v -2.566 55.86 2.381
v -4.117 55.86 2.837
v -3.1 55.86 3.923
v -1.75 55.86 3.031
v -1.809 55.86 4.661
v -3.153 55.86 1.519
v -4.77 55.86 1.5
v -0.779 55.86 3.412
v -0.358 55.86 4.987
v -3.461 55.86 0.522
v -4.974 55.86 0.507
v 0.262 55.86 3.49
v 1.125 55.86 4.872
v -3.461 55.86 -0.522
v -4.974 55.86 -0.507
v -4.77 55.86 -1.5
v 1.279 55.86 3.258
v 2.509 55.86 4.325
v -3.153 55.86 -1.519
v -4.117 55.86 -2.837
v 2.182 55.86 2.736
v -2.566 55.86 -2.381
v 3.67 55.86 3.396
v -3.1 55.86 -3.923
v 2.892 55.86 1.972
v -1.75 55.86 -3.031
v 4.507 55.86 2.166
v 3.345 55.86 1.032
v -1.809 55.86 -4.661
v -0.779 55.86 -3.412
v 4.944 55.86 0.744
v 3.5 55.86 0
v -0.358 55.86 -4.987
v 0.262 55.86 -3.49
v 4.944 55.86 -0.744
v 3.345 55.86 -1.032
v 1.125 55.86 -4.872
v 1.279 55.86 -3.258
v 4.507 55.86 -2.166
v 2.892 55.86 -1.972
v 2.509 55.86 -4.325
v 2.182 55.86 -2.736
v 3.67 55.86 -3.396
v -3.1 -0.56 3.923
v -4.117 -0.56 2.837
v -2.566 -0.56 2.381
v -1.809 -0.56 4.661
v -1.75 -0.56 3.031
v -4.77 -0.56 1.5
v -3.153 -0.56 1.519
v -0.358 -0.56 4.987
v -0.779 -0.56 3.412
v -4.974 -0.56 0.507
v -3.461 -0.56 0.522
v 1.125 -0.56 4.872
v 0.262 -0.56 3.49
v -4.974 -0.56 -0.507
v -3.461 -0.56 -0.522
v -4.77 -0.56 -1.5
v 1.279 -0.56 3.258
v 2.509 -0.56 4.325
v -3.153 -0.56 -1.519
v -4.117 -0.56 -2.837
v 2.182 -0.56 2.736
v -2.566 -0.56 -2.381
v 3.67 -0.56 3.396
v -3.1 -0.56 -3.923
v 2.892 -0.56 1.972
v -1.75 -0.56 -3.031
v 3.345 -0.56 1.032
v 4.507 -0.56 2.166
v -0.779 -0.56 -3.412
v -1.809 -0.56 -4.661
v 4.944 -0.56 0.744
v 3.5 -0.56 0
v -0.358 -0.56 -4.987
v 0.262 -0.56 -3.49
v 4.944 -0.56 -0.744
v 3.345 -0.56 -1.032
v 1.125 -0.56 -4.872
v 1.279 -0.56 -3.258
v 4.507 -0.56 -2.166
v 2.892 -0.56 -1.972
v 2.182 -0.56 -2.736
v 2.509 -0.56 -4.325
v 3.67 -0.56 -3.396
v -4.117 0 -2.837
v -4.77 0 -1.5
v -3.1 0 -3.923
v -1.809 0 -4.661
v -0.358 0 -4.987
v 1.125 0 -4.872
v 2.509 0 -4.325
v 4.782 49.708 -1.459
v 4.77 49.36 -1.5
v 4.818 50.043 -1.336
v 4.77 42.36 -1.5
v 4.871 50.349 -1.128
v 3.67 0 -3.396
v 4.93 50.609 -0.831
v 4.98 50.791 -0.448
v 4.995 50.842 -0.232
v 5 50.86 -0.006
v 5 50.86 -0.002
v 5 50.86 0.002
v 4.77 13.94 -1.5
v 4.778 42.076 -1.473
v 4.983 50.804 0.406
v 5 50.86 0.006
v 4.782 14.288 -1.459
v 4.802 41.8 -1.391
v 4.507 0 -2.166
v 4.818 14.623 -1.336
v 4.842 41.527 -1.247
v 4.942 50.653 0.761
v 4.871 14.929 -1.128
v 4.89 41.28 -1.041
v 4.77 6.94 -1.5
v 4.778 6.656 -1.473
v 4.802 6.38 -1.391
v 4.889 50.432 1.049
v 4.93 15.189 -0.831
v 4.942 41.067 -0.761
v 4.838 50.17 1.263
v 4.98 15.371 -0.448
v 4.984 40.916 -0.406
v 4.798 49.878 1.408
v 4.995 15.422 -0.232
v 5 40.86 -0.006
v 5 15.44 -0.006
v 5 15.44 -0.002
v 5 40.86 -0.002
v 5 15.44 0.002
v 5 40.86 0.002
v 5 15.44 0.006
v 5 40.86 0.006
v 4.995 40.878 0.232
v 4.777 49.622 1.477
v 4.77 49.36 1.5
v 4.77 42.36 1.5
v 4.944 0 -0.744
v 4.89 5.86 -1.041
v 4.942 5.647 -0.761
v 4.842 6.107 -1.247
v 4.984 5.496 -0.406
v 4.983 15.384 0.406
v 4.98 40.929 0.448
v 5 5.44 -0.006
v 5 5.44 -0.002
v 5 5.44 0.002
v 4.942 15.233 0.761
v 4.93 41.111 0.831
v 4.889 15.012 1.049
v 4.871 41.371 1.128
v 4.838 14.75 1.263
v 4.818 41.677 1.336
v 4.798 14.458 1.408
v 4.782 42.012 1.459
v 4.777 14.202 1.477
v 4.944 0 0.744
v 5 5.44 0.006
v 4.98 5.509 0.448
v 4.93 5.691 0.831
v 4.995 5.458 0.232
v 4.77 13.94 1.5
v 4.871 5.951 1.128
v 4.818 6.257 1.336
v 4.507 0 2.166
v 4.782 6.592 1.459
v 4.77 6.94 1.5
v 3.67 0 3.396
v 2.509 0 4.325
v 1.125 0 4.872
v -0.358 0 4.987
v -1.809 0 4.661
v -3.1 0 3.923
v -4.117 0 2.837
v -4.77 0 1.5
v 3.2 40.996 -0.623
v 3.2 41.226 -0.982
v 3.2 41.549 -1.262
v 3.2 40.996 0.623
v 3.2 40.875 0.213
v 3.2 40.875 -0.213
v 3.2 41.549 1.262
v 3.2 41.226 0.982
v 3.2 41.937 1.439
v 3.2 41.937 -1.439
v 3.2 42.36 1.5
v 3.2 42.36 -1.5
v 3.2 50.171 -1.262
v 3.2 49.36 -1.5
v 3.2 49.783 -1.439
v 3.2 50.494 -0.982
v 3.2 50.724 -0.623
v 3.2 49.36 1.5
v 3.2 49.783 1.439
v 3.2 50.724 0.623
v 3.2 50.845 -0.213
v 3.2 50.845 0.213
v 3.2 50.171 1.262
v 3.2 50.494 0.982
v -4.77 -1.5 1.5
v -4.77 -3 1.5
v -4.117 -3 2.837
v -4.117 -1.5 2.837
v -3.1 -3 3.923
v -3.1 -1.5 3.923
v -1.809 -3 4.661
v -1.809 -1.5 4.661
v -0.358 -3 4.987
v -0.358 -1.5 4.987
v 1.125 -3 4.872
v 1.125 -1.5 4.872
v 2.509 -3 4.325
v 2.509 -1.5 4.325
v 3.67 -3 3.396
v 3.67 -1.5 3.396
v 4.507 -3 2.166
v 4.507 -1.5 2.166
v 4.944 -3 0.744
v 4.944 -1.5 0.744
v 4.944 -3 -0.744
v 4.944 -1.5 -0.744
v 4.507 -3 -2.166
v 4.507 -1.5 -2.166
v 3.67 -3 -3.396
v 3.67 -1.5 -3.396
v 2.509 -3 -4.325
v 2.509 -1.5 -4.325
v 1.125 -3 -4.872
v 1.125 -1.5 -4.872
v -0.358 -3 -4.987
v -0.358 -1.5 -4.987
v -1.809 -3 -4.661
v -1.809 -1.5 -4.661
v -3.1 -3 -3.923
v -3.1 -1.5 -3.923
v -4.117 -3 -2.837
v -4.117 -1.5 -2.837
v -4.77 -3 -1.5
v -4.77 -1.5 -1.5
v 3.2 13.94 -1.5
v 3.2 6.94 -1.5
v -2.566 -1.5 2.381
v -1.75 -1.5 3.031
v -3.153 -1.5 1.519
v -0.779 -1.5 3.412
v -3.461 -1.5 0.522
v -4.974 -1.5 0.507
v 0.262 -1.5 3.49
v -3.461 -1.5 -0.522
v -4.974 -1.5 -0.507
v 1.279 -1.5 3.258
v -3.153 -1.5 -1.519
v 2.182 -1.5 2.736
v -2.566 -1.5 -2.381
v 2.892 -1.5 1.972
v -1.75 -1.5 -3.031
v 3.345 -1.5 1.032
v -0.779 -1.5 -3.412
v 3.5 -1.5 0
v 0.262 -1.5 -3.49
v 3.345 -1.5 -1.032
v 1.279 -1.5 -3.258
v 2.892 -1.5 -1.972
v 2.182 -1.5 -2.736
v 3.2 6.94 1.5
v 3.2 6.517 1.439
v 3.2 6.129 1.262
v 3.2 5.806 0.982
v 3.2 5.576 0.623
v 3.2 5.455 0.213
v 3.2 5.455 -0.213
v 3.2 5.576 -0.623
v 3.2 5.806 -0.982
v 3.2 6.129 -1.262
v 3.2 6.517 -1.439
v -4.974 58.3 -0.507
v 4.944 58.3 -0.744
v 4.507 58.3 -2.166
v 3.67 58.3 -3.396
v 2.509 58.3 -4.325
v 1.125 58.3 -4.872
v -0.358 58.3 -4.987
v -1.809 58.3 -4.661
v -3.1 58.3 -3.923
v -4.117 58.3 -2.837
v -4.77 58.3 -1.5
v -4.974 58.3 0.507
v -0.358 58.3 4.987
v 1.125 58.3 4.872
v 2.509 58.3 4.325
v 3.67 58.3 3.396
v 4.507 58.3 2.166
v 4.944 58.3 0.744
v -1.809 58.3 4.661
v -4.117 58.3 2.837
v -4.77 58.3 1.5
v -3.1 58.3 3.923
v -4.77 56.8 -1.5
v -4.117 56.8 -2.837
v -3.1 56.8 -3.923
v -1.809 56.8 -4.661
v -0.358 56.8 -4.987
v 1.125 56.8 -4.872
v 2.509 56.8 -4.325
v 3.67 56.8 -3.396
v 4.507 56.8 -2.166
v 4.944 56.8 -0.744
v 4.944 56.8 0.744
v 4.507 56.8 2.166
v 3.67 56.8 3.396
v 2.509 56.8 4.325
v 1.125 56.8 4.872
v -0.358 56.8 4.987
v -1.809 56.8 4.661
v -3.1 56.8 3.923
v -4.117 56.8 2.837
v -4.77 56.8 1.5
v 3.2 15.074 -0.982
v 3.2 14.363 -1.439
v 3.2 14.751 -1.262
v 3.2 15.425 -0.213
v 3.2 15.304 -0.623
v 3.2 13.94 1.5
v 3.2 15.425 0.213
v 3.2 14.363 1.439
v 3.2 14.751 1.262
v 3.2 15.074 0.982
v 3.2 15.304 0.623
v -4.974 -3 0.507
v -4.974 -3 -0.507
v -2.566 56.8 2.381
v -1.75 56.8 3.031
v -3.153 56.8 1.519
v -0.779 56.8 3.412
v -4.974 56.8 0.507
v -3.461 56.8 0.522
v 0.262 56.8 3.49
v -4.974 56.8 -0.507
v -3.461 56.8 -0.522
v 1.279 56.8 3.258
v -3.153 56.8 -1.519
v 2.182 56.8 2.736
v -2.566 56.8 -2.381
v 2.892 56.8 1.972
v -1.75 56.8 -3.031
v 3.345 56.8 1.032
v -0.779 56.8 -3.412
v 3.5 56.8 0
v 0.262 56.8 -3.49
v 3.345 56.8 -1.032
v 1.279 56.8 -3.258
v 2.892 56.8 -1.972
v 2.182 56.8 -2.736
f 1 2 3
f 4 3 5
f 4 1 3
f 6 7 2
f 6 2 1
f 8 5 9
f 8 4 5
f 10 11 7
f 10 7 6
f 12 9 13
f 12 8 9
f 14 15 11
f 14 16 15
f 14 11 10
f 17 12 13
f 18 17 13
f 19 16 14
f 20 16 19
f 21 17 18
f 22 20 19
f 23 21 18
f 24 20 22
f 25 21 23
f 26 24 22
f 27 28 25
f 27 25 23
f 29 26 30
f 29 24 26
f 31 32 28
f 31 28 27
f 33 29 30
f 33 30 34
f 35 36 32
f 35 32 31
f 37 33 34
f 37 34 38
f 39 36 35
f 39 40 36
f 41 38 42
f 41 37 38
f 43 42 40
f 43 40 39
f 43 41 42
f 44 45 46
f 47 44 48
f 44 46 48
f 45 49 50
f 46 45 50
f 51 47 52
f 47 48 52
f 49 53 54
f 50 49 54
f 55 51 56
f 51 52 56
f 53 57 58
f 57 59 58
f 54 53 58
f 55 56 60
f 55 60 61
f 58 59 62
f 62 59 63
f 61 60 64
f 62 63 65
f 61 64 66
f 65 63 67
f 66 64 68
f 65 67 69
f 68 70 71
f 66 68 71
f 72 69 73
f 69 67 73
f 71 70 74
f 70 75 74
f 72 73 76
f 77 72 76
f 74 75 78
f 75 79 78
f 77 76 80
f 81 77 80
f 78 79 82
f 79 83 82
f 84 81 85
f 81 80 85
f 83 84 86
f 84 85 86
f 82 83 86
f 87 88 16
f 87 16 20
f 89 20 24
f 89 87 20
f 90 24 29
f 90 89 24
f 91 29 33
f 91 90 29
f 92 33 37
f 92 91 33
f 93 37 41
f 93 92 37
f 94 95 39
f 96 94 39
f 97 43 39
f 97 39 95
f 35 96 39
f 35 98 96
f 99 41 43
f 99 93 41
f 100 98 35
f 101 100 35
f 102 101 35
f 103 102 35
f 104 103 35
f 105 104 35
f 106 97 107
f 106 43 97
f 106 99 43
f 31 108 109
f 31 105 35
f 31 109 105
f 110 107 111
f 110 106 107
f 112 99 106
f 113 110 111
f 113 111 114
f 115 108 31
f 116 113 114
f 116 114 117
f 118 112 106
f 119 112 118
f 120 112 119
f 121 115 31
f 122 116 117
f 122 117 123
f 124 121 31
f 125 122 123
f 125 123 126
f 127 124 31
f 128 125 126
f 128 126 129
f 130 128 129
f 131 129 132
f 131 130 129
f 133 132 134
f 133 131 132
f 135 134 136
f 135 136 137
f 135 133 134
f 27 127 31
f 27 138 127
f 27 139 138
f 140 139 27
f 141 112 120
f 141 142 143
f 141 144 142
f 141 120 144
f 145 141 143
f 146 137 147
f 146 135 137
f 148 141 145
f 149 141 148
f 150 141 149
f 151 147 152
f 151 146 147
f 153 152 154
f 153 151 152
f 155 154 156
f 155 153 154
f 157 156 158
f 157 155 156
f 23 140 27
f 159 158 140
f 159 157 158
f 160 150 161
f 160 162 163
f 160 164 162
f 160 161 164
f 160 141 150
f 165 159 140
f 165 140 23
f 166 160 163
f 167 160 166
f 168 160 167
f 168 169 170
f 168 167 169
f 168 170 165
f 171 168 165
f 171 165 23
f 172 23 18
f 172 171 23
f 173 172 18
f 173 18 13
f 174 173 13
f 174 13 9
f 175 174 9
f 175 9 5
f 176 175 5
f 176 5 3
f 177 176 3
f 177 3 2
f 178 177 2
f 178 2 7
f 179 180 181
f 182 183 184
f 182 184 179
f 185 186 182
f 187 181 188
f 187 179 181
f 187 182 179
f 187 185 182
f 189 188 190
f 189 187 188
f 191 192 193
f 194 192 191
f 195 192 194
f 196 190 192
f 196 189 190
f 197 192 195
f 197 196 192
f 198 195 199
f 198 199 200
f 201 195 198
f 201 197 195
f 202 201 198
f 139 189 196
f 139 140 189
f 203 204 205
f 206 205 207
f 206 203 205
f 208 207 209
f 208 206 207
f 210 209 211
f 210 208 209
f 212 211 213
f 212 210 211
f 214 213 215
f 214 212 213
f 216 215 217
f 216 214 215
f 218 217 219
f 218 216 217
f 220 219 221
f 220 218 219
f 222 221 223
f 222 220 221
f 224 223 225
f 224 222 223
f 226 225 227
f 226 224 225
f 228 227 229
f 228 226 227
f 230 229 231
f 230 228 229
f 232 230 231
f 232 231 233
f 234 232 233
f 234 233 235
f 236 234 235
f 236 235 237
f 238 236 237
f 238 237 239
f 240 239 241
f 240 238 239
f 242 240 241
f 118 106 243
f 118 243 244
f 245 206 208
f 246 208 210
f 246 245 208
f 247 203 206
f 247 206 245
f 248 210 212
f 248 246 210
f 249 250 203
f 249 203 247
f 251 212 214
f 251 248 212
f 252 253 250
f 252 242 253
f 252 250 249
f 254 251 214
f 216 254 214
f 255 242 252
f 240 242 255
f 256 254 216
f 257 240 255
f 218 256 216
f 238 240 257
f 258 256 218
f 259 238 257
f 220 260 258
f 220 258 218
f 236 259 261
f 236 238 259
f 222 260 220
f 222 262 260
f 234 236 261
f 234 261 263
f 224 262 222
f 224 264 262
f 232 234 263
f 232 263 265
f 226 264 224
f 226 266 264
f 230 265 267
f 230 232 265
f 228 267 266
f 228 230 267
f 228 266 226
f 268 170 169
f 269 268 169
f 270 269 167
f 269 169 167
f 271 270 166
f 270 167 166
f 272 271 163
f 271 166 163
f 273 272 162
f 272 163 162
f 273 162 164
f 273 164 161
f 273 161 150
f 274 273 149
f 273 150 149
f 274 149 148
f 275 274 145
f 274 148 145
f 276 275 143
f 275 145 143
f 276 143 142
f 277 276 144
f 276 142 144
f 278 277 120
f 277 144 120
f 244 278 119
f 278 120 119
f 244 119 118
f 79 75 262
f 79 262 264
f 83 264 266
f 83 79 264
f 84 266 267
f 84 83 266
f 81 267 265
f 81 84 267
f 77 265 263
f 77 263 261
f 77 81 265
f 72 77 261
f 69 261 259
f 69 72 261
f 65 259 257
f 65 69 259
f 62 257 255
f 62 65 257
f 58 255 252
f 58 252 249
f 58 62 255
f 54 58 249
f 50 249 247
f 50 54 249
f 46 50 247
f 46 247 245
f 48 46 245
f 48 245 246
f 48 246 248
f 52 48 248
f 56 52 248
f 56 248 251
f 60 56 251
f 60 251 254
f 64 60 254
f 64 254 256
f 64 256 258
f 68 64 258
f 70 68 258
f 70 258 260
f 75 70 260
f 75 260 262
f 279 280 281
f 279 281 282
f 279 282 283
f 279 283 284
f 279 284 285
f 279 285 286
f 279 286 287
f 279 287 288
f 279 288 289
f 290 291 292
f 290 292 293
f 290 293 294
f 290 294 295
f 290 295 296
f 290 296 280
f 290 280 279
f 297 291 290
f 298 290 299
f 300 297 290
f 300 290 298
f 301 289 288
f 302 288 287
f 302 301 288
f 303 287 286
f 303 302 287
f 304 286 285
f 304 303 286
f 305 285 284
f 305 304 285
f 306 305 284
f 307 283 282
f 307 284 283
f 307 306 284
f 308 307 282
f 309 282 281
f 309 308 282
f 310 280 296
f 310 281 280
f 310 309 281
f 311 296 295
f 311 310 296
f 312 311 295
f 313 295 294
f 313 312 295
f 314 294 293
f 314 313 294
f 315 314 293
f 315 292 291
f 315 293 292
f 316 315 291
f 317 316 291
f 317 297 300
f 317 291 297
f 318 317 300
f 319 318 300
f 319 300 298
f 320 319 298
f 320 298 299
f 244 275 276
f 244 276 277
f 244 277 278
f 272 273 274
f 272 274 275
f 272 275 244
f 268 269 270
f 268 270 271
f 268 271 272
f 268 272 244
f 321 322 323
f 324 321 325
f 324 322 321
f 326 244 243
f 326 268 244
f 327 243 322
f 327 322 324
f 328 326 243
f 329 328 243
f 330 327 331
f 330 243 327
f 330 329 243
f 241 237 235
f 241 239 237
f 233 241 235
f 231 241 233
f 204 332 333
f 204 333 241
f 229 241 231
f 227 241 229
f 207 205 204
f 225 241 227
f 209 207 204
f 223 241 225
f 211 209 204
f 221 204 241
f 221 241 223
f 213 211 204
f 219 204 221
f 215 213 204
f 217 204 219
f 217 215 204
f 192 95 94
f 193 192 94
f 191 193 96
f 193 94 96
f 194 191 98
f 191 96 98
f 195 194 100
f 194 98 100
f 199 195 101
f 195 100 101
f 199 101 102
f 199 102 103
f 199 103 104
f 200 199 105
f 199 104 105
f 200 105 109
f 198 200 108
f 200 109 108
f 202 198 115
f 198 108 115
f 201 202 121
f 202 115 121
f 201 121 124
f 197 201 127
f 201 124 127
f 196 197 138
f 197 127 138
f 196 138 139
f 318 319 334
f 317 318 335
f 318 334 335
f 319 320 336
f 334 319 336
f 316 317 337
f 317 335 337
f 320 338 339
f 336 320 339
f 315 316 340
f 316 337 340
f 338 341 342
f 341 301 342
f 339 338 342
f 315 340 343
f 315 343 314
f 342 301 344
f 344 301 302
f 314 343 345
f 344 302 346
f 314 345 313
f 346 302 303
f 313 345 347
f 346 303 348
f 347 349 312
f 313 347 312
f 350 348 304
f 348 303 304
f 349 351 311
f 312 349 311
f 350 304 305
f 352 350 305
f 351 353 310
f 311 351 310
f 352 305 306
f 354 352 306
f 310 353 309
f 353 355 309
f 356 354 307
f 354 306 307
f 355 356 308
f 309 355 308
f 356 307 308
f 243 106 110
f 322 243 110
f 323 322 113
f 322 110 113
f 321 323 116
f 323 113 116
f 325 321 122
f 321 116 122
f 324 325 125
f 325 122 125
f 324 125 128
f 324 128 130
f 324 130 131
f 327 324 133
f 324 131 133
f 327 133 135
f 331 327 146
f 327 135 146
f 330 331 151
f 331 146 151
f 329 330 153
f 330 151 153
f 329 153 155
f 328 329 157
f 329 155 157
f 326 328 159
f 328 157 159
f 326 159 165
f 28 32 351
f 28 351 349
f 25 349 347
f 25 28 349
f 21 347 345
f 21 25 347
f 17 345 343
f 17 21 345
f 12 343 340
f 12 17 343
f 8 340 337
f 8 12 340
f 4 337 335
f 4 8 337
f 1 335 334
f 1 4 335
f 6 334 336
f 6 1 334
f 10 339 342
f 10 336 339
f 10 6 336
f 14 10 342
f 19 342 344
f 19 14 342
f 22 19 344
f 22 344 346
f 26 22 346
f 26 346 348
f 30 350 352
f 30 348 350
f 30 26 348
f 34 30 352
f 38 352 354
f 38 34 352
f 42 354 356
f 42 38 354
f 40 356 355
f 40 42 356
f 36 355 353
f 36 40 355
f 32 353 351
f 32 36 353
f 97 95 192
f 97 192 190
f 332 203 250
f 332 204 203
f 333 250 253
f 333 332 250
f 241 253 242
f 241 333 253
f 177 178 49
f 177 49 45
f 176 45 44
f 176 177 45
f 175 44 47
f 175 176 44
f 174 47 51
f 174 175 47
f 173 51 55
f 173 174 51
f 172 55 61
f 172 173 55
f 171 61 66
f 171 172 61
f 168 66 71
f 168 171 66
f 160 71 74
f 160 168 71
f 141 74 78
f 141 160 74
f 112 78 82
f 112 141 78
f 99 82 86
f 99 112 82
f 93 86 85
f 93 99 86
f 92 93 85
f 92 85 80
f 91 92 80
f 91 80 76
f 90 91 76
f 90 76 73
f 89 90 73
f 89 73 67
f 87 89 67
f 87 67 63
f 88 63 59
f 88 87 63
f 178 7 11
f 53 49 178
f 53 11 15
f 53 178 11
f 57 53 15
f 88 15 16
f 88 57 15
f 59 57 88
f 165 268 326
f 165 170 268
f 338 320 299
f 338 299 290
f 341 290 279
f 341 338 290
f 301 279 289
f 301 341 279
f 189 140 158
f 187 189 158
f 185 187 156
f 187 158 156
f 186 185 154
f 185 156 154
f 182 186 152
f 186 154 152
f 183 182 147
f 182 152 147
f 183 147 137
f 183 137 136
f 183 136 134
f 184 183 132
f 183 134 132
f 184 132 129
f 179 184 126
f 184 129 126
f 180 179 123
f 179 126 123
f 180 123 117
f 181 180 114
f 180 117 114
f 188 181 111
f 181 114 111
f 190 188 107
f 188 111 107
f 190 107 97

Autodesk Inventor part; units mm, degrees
ref_plane "XZ Plane" through (0, 0, 0) normal (0, 1, 0) x (-1, 0, 0)
ref_plane "XY Plane" through (0, 0, 0) normal (0, 0, 1) x (1, 0, 0)
sketch "Sketch1" plane through (0, 0, 0) normal (0, 1, 0) x (-1, 0, 0)
  arc A0 (4.7697, 1.5) -> (4.7697, -1.5) centre (0, 0) ccw
  circle A1 centre (0, 0) radius 5
  dimension "d0" = 10
extrude "Extrusion1" add sketch "Sketch1" along normal blind 58.3
sketch "Sketch2" plane through (0, 0, 0) normal (0, -1, 0) x (1, 0, 0)
  arc A0 (-4.7697, -1.5) -> (-4.7697, 1.5) centre (0, 0) ccw projected
  line L0 (-3.2, 1.5) -> (-4.7697, 1.5) projected
  line L1 (-3.2, -1.5) -> (-3.2, 1.5) projected
  line L2 (-4.7697, -1.5) -> (-3.2, -1.5) projected
  circle A1 centre (0, 0) radius 5
extrude "Extrusion2" add sketch "Sketch2" along normal blind 3
sketch "Sketch3" plane through (0, 0, 0) normal (0, 0, 1) x (1, 0, 0)
  line L0 (7.5, -1.5) -> (3.5, -1.5)
  line L1 (3.5, -1.5) -> (3.5, -0.56)
  line L2 (3.5, -0.56) -> (7.5, -0.56)
  line L3 (7.5, -0.56) -> (7.5, -1.5)
  line L4 (-4.7697, -3) -> (5, -3) projected
  line L5 (5, -3) -> (5, 58.3) projected
  line L6 (0, -15.26) -> (0, 70.56) projected
  line L7 (5, -3) -> (5, 58.3) projected
  line L8 (5, 27.65) -> (17.8962, 27.65)
  line L9 (7.5, 56.8) -> (3.5, 56.8)
  line L10 (3.5, 56.8) -> (3.5, 55.86)
  line L11 (3.5, 55.86) -> (7.5, 55.86)
  line L12 (7.5, 55.86) -> (7.5, 56.8)
  point P0 (0, 0)
  point P1 (0, 55.3)
  dimension "d10" = 0.94
  dimension "d11" = 4
  dimension "d12" = 1.5
  dimension "d21" = 1.5
revolve "Revolution1" cut sketch "Sketch3" angle 360 about axis through (0, -10, 0) along (0, 1, 0)
ref_plane "Work Plane1" through (5, 0, 0) normal (1, 0, 0) x (0, 1, 0)
sketch "Sketch6" plane through (5, 0, 0) normal (1, 0, 0) x (0, 1, 0)
  line L0 (6.94, 1.5) -> (13.94, 1.5)
  line L1 (13.94, 1.5) -> (13.94, -1.5)
  line L2 (13.94, -1.5) -> (6.94, -1.5)
  line L3 (6.94, -1.5) -> (6.94, 1.5)
  circle A0 centre (6.94, 0) radius 1.5
  circle A1 centre (13.94, 0) radius 1.5
  line L4 (-0.56, 5) -> (55.86, 5) projected
  line L5 (-0.56, -5) -> (55.86, -5) projected
  line L6 (42.36, 1.5) -> (49.36, 1.5)
  line L7 (49.36, 1.5) -> (49.36, -1.5)
  line L8 (49.36, -1.5) -> (42.36, -1.5)
  line L9 (42.36, -1.5) -> (42.36, 1.5)
  circle A2 centre (42.36, 0) radius 1.5
  circle A3 centre (49.36, 0) radius 1.5
  line L10 (-3, 5) -> (-3, -5) projected
  line L11 (58.3, -5) -> (58.3, 5) projected
  line L12 (-0.56, -5) -> (-0.56, 5) projected
  line L13 (55.86, 5) -> (55.86, -5) projected
  point P0 (0, 0)
  dimension "d26" = 3
  dimension "d22" = 3
  dimension "d23" = 3.5
  dimension "d24" = 7
  dimension "d25" = 7
  dimension "d27" = 3.5
  dimension "d33" = 7.5
  dimension "d34" = 6.5
extrude "Extrusion4" cut sketch "Sketch6" against normal blind 1.8 contours A0 L3 | L0 A1 L2 A0 | L3 A0 | A1 L1 | L1 A1 | A2 L9 | L6 A3 L8 A2 | L9 A2 | A3 L7 | L7 A3
properties part number "AxeVerticalManivelle" material "Stainless Steel"
